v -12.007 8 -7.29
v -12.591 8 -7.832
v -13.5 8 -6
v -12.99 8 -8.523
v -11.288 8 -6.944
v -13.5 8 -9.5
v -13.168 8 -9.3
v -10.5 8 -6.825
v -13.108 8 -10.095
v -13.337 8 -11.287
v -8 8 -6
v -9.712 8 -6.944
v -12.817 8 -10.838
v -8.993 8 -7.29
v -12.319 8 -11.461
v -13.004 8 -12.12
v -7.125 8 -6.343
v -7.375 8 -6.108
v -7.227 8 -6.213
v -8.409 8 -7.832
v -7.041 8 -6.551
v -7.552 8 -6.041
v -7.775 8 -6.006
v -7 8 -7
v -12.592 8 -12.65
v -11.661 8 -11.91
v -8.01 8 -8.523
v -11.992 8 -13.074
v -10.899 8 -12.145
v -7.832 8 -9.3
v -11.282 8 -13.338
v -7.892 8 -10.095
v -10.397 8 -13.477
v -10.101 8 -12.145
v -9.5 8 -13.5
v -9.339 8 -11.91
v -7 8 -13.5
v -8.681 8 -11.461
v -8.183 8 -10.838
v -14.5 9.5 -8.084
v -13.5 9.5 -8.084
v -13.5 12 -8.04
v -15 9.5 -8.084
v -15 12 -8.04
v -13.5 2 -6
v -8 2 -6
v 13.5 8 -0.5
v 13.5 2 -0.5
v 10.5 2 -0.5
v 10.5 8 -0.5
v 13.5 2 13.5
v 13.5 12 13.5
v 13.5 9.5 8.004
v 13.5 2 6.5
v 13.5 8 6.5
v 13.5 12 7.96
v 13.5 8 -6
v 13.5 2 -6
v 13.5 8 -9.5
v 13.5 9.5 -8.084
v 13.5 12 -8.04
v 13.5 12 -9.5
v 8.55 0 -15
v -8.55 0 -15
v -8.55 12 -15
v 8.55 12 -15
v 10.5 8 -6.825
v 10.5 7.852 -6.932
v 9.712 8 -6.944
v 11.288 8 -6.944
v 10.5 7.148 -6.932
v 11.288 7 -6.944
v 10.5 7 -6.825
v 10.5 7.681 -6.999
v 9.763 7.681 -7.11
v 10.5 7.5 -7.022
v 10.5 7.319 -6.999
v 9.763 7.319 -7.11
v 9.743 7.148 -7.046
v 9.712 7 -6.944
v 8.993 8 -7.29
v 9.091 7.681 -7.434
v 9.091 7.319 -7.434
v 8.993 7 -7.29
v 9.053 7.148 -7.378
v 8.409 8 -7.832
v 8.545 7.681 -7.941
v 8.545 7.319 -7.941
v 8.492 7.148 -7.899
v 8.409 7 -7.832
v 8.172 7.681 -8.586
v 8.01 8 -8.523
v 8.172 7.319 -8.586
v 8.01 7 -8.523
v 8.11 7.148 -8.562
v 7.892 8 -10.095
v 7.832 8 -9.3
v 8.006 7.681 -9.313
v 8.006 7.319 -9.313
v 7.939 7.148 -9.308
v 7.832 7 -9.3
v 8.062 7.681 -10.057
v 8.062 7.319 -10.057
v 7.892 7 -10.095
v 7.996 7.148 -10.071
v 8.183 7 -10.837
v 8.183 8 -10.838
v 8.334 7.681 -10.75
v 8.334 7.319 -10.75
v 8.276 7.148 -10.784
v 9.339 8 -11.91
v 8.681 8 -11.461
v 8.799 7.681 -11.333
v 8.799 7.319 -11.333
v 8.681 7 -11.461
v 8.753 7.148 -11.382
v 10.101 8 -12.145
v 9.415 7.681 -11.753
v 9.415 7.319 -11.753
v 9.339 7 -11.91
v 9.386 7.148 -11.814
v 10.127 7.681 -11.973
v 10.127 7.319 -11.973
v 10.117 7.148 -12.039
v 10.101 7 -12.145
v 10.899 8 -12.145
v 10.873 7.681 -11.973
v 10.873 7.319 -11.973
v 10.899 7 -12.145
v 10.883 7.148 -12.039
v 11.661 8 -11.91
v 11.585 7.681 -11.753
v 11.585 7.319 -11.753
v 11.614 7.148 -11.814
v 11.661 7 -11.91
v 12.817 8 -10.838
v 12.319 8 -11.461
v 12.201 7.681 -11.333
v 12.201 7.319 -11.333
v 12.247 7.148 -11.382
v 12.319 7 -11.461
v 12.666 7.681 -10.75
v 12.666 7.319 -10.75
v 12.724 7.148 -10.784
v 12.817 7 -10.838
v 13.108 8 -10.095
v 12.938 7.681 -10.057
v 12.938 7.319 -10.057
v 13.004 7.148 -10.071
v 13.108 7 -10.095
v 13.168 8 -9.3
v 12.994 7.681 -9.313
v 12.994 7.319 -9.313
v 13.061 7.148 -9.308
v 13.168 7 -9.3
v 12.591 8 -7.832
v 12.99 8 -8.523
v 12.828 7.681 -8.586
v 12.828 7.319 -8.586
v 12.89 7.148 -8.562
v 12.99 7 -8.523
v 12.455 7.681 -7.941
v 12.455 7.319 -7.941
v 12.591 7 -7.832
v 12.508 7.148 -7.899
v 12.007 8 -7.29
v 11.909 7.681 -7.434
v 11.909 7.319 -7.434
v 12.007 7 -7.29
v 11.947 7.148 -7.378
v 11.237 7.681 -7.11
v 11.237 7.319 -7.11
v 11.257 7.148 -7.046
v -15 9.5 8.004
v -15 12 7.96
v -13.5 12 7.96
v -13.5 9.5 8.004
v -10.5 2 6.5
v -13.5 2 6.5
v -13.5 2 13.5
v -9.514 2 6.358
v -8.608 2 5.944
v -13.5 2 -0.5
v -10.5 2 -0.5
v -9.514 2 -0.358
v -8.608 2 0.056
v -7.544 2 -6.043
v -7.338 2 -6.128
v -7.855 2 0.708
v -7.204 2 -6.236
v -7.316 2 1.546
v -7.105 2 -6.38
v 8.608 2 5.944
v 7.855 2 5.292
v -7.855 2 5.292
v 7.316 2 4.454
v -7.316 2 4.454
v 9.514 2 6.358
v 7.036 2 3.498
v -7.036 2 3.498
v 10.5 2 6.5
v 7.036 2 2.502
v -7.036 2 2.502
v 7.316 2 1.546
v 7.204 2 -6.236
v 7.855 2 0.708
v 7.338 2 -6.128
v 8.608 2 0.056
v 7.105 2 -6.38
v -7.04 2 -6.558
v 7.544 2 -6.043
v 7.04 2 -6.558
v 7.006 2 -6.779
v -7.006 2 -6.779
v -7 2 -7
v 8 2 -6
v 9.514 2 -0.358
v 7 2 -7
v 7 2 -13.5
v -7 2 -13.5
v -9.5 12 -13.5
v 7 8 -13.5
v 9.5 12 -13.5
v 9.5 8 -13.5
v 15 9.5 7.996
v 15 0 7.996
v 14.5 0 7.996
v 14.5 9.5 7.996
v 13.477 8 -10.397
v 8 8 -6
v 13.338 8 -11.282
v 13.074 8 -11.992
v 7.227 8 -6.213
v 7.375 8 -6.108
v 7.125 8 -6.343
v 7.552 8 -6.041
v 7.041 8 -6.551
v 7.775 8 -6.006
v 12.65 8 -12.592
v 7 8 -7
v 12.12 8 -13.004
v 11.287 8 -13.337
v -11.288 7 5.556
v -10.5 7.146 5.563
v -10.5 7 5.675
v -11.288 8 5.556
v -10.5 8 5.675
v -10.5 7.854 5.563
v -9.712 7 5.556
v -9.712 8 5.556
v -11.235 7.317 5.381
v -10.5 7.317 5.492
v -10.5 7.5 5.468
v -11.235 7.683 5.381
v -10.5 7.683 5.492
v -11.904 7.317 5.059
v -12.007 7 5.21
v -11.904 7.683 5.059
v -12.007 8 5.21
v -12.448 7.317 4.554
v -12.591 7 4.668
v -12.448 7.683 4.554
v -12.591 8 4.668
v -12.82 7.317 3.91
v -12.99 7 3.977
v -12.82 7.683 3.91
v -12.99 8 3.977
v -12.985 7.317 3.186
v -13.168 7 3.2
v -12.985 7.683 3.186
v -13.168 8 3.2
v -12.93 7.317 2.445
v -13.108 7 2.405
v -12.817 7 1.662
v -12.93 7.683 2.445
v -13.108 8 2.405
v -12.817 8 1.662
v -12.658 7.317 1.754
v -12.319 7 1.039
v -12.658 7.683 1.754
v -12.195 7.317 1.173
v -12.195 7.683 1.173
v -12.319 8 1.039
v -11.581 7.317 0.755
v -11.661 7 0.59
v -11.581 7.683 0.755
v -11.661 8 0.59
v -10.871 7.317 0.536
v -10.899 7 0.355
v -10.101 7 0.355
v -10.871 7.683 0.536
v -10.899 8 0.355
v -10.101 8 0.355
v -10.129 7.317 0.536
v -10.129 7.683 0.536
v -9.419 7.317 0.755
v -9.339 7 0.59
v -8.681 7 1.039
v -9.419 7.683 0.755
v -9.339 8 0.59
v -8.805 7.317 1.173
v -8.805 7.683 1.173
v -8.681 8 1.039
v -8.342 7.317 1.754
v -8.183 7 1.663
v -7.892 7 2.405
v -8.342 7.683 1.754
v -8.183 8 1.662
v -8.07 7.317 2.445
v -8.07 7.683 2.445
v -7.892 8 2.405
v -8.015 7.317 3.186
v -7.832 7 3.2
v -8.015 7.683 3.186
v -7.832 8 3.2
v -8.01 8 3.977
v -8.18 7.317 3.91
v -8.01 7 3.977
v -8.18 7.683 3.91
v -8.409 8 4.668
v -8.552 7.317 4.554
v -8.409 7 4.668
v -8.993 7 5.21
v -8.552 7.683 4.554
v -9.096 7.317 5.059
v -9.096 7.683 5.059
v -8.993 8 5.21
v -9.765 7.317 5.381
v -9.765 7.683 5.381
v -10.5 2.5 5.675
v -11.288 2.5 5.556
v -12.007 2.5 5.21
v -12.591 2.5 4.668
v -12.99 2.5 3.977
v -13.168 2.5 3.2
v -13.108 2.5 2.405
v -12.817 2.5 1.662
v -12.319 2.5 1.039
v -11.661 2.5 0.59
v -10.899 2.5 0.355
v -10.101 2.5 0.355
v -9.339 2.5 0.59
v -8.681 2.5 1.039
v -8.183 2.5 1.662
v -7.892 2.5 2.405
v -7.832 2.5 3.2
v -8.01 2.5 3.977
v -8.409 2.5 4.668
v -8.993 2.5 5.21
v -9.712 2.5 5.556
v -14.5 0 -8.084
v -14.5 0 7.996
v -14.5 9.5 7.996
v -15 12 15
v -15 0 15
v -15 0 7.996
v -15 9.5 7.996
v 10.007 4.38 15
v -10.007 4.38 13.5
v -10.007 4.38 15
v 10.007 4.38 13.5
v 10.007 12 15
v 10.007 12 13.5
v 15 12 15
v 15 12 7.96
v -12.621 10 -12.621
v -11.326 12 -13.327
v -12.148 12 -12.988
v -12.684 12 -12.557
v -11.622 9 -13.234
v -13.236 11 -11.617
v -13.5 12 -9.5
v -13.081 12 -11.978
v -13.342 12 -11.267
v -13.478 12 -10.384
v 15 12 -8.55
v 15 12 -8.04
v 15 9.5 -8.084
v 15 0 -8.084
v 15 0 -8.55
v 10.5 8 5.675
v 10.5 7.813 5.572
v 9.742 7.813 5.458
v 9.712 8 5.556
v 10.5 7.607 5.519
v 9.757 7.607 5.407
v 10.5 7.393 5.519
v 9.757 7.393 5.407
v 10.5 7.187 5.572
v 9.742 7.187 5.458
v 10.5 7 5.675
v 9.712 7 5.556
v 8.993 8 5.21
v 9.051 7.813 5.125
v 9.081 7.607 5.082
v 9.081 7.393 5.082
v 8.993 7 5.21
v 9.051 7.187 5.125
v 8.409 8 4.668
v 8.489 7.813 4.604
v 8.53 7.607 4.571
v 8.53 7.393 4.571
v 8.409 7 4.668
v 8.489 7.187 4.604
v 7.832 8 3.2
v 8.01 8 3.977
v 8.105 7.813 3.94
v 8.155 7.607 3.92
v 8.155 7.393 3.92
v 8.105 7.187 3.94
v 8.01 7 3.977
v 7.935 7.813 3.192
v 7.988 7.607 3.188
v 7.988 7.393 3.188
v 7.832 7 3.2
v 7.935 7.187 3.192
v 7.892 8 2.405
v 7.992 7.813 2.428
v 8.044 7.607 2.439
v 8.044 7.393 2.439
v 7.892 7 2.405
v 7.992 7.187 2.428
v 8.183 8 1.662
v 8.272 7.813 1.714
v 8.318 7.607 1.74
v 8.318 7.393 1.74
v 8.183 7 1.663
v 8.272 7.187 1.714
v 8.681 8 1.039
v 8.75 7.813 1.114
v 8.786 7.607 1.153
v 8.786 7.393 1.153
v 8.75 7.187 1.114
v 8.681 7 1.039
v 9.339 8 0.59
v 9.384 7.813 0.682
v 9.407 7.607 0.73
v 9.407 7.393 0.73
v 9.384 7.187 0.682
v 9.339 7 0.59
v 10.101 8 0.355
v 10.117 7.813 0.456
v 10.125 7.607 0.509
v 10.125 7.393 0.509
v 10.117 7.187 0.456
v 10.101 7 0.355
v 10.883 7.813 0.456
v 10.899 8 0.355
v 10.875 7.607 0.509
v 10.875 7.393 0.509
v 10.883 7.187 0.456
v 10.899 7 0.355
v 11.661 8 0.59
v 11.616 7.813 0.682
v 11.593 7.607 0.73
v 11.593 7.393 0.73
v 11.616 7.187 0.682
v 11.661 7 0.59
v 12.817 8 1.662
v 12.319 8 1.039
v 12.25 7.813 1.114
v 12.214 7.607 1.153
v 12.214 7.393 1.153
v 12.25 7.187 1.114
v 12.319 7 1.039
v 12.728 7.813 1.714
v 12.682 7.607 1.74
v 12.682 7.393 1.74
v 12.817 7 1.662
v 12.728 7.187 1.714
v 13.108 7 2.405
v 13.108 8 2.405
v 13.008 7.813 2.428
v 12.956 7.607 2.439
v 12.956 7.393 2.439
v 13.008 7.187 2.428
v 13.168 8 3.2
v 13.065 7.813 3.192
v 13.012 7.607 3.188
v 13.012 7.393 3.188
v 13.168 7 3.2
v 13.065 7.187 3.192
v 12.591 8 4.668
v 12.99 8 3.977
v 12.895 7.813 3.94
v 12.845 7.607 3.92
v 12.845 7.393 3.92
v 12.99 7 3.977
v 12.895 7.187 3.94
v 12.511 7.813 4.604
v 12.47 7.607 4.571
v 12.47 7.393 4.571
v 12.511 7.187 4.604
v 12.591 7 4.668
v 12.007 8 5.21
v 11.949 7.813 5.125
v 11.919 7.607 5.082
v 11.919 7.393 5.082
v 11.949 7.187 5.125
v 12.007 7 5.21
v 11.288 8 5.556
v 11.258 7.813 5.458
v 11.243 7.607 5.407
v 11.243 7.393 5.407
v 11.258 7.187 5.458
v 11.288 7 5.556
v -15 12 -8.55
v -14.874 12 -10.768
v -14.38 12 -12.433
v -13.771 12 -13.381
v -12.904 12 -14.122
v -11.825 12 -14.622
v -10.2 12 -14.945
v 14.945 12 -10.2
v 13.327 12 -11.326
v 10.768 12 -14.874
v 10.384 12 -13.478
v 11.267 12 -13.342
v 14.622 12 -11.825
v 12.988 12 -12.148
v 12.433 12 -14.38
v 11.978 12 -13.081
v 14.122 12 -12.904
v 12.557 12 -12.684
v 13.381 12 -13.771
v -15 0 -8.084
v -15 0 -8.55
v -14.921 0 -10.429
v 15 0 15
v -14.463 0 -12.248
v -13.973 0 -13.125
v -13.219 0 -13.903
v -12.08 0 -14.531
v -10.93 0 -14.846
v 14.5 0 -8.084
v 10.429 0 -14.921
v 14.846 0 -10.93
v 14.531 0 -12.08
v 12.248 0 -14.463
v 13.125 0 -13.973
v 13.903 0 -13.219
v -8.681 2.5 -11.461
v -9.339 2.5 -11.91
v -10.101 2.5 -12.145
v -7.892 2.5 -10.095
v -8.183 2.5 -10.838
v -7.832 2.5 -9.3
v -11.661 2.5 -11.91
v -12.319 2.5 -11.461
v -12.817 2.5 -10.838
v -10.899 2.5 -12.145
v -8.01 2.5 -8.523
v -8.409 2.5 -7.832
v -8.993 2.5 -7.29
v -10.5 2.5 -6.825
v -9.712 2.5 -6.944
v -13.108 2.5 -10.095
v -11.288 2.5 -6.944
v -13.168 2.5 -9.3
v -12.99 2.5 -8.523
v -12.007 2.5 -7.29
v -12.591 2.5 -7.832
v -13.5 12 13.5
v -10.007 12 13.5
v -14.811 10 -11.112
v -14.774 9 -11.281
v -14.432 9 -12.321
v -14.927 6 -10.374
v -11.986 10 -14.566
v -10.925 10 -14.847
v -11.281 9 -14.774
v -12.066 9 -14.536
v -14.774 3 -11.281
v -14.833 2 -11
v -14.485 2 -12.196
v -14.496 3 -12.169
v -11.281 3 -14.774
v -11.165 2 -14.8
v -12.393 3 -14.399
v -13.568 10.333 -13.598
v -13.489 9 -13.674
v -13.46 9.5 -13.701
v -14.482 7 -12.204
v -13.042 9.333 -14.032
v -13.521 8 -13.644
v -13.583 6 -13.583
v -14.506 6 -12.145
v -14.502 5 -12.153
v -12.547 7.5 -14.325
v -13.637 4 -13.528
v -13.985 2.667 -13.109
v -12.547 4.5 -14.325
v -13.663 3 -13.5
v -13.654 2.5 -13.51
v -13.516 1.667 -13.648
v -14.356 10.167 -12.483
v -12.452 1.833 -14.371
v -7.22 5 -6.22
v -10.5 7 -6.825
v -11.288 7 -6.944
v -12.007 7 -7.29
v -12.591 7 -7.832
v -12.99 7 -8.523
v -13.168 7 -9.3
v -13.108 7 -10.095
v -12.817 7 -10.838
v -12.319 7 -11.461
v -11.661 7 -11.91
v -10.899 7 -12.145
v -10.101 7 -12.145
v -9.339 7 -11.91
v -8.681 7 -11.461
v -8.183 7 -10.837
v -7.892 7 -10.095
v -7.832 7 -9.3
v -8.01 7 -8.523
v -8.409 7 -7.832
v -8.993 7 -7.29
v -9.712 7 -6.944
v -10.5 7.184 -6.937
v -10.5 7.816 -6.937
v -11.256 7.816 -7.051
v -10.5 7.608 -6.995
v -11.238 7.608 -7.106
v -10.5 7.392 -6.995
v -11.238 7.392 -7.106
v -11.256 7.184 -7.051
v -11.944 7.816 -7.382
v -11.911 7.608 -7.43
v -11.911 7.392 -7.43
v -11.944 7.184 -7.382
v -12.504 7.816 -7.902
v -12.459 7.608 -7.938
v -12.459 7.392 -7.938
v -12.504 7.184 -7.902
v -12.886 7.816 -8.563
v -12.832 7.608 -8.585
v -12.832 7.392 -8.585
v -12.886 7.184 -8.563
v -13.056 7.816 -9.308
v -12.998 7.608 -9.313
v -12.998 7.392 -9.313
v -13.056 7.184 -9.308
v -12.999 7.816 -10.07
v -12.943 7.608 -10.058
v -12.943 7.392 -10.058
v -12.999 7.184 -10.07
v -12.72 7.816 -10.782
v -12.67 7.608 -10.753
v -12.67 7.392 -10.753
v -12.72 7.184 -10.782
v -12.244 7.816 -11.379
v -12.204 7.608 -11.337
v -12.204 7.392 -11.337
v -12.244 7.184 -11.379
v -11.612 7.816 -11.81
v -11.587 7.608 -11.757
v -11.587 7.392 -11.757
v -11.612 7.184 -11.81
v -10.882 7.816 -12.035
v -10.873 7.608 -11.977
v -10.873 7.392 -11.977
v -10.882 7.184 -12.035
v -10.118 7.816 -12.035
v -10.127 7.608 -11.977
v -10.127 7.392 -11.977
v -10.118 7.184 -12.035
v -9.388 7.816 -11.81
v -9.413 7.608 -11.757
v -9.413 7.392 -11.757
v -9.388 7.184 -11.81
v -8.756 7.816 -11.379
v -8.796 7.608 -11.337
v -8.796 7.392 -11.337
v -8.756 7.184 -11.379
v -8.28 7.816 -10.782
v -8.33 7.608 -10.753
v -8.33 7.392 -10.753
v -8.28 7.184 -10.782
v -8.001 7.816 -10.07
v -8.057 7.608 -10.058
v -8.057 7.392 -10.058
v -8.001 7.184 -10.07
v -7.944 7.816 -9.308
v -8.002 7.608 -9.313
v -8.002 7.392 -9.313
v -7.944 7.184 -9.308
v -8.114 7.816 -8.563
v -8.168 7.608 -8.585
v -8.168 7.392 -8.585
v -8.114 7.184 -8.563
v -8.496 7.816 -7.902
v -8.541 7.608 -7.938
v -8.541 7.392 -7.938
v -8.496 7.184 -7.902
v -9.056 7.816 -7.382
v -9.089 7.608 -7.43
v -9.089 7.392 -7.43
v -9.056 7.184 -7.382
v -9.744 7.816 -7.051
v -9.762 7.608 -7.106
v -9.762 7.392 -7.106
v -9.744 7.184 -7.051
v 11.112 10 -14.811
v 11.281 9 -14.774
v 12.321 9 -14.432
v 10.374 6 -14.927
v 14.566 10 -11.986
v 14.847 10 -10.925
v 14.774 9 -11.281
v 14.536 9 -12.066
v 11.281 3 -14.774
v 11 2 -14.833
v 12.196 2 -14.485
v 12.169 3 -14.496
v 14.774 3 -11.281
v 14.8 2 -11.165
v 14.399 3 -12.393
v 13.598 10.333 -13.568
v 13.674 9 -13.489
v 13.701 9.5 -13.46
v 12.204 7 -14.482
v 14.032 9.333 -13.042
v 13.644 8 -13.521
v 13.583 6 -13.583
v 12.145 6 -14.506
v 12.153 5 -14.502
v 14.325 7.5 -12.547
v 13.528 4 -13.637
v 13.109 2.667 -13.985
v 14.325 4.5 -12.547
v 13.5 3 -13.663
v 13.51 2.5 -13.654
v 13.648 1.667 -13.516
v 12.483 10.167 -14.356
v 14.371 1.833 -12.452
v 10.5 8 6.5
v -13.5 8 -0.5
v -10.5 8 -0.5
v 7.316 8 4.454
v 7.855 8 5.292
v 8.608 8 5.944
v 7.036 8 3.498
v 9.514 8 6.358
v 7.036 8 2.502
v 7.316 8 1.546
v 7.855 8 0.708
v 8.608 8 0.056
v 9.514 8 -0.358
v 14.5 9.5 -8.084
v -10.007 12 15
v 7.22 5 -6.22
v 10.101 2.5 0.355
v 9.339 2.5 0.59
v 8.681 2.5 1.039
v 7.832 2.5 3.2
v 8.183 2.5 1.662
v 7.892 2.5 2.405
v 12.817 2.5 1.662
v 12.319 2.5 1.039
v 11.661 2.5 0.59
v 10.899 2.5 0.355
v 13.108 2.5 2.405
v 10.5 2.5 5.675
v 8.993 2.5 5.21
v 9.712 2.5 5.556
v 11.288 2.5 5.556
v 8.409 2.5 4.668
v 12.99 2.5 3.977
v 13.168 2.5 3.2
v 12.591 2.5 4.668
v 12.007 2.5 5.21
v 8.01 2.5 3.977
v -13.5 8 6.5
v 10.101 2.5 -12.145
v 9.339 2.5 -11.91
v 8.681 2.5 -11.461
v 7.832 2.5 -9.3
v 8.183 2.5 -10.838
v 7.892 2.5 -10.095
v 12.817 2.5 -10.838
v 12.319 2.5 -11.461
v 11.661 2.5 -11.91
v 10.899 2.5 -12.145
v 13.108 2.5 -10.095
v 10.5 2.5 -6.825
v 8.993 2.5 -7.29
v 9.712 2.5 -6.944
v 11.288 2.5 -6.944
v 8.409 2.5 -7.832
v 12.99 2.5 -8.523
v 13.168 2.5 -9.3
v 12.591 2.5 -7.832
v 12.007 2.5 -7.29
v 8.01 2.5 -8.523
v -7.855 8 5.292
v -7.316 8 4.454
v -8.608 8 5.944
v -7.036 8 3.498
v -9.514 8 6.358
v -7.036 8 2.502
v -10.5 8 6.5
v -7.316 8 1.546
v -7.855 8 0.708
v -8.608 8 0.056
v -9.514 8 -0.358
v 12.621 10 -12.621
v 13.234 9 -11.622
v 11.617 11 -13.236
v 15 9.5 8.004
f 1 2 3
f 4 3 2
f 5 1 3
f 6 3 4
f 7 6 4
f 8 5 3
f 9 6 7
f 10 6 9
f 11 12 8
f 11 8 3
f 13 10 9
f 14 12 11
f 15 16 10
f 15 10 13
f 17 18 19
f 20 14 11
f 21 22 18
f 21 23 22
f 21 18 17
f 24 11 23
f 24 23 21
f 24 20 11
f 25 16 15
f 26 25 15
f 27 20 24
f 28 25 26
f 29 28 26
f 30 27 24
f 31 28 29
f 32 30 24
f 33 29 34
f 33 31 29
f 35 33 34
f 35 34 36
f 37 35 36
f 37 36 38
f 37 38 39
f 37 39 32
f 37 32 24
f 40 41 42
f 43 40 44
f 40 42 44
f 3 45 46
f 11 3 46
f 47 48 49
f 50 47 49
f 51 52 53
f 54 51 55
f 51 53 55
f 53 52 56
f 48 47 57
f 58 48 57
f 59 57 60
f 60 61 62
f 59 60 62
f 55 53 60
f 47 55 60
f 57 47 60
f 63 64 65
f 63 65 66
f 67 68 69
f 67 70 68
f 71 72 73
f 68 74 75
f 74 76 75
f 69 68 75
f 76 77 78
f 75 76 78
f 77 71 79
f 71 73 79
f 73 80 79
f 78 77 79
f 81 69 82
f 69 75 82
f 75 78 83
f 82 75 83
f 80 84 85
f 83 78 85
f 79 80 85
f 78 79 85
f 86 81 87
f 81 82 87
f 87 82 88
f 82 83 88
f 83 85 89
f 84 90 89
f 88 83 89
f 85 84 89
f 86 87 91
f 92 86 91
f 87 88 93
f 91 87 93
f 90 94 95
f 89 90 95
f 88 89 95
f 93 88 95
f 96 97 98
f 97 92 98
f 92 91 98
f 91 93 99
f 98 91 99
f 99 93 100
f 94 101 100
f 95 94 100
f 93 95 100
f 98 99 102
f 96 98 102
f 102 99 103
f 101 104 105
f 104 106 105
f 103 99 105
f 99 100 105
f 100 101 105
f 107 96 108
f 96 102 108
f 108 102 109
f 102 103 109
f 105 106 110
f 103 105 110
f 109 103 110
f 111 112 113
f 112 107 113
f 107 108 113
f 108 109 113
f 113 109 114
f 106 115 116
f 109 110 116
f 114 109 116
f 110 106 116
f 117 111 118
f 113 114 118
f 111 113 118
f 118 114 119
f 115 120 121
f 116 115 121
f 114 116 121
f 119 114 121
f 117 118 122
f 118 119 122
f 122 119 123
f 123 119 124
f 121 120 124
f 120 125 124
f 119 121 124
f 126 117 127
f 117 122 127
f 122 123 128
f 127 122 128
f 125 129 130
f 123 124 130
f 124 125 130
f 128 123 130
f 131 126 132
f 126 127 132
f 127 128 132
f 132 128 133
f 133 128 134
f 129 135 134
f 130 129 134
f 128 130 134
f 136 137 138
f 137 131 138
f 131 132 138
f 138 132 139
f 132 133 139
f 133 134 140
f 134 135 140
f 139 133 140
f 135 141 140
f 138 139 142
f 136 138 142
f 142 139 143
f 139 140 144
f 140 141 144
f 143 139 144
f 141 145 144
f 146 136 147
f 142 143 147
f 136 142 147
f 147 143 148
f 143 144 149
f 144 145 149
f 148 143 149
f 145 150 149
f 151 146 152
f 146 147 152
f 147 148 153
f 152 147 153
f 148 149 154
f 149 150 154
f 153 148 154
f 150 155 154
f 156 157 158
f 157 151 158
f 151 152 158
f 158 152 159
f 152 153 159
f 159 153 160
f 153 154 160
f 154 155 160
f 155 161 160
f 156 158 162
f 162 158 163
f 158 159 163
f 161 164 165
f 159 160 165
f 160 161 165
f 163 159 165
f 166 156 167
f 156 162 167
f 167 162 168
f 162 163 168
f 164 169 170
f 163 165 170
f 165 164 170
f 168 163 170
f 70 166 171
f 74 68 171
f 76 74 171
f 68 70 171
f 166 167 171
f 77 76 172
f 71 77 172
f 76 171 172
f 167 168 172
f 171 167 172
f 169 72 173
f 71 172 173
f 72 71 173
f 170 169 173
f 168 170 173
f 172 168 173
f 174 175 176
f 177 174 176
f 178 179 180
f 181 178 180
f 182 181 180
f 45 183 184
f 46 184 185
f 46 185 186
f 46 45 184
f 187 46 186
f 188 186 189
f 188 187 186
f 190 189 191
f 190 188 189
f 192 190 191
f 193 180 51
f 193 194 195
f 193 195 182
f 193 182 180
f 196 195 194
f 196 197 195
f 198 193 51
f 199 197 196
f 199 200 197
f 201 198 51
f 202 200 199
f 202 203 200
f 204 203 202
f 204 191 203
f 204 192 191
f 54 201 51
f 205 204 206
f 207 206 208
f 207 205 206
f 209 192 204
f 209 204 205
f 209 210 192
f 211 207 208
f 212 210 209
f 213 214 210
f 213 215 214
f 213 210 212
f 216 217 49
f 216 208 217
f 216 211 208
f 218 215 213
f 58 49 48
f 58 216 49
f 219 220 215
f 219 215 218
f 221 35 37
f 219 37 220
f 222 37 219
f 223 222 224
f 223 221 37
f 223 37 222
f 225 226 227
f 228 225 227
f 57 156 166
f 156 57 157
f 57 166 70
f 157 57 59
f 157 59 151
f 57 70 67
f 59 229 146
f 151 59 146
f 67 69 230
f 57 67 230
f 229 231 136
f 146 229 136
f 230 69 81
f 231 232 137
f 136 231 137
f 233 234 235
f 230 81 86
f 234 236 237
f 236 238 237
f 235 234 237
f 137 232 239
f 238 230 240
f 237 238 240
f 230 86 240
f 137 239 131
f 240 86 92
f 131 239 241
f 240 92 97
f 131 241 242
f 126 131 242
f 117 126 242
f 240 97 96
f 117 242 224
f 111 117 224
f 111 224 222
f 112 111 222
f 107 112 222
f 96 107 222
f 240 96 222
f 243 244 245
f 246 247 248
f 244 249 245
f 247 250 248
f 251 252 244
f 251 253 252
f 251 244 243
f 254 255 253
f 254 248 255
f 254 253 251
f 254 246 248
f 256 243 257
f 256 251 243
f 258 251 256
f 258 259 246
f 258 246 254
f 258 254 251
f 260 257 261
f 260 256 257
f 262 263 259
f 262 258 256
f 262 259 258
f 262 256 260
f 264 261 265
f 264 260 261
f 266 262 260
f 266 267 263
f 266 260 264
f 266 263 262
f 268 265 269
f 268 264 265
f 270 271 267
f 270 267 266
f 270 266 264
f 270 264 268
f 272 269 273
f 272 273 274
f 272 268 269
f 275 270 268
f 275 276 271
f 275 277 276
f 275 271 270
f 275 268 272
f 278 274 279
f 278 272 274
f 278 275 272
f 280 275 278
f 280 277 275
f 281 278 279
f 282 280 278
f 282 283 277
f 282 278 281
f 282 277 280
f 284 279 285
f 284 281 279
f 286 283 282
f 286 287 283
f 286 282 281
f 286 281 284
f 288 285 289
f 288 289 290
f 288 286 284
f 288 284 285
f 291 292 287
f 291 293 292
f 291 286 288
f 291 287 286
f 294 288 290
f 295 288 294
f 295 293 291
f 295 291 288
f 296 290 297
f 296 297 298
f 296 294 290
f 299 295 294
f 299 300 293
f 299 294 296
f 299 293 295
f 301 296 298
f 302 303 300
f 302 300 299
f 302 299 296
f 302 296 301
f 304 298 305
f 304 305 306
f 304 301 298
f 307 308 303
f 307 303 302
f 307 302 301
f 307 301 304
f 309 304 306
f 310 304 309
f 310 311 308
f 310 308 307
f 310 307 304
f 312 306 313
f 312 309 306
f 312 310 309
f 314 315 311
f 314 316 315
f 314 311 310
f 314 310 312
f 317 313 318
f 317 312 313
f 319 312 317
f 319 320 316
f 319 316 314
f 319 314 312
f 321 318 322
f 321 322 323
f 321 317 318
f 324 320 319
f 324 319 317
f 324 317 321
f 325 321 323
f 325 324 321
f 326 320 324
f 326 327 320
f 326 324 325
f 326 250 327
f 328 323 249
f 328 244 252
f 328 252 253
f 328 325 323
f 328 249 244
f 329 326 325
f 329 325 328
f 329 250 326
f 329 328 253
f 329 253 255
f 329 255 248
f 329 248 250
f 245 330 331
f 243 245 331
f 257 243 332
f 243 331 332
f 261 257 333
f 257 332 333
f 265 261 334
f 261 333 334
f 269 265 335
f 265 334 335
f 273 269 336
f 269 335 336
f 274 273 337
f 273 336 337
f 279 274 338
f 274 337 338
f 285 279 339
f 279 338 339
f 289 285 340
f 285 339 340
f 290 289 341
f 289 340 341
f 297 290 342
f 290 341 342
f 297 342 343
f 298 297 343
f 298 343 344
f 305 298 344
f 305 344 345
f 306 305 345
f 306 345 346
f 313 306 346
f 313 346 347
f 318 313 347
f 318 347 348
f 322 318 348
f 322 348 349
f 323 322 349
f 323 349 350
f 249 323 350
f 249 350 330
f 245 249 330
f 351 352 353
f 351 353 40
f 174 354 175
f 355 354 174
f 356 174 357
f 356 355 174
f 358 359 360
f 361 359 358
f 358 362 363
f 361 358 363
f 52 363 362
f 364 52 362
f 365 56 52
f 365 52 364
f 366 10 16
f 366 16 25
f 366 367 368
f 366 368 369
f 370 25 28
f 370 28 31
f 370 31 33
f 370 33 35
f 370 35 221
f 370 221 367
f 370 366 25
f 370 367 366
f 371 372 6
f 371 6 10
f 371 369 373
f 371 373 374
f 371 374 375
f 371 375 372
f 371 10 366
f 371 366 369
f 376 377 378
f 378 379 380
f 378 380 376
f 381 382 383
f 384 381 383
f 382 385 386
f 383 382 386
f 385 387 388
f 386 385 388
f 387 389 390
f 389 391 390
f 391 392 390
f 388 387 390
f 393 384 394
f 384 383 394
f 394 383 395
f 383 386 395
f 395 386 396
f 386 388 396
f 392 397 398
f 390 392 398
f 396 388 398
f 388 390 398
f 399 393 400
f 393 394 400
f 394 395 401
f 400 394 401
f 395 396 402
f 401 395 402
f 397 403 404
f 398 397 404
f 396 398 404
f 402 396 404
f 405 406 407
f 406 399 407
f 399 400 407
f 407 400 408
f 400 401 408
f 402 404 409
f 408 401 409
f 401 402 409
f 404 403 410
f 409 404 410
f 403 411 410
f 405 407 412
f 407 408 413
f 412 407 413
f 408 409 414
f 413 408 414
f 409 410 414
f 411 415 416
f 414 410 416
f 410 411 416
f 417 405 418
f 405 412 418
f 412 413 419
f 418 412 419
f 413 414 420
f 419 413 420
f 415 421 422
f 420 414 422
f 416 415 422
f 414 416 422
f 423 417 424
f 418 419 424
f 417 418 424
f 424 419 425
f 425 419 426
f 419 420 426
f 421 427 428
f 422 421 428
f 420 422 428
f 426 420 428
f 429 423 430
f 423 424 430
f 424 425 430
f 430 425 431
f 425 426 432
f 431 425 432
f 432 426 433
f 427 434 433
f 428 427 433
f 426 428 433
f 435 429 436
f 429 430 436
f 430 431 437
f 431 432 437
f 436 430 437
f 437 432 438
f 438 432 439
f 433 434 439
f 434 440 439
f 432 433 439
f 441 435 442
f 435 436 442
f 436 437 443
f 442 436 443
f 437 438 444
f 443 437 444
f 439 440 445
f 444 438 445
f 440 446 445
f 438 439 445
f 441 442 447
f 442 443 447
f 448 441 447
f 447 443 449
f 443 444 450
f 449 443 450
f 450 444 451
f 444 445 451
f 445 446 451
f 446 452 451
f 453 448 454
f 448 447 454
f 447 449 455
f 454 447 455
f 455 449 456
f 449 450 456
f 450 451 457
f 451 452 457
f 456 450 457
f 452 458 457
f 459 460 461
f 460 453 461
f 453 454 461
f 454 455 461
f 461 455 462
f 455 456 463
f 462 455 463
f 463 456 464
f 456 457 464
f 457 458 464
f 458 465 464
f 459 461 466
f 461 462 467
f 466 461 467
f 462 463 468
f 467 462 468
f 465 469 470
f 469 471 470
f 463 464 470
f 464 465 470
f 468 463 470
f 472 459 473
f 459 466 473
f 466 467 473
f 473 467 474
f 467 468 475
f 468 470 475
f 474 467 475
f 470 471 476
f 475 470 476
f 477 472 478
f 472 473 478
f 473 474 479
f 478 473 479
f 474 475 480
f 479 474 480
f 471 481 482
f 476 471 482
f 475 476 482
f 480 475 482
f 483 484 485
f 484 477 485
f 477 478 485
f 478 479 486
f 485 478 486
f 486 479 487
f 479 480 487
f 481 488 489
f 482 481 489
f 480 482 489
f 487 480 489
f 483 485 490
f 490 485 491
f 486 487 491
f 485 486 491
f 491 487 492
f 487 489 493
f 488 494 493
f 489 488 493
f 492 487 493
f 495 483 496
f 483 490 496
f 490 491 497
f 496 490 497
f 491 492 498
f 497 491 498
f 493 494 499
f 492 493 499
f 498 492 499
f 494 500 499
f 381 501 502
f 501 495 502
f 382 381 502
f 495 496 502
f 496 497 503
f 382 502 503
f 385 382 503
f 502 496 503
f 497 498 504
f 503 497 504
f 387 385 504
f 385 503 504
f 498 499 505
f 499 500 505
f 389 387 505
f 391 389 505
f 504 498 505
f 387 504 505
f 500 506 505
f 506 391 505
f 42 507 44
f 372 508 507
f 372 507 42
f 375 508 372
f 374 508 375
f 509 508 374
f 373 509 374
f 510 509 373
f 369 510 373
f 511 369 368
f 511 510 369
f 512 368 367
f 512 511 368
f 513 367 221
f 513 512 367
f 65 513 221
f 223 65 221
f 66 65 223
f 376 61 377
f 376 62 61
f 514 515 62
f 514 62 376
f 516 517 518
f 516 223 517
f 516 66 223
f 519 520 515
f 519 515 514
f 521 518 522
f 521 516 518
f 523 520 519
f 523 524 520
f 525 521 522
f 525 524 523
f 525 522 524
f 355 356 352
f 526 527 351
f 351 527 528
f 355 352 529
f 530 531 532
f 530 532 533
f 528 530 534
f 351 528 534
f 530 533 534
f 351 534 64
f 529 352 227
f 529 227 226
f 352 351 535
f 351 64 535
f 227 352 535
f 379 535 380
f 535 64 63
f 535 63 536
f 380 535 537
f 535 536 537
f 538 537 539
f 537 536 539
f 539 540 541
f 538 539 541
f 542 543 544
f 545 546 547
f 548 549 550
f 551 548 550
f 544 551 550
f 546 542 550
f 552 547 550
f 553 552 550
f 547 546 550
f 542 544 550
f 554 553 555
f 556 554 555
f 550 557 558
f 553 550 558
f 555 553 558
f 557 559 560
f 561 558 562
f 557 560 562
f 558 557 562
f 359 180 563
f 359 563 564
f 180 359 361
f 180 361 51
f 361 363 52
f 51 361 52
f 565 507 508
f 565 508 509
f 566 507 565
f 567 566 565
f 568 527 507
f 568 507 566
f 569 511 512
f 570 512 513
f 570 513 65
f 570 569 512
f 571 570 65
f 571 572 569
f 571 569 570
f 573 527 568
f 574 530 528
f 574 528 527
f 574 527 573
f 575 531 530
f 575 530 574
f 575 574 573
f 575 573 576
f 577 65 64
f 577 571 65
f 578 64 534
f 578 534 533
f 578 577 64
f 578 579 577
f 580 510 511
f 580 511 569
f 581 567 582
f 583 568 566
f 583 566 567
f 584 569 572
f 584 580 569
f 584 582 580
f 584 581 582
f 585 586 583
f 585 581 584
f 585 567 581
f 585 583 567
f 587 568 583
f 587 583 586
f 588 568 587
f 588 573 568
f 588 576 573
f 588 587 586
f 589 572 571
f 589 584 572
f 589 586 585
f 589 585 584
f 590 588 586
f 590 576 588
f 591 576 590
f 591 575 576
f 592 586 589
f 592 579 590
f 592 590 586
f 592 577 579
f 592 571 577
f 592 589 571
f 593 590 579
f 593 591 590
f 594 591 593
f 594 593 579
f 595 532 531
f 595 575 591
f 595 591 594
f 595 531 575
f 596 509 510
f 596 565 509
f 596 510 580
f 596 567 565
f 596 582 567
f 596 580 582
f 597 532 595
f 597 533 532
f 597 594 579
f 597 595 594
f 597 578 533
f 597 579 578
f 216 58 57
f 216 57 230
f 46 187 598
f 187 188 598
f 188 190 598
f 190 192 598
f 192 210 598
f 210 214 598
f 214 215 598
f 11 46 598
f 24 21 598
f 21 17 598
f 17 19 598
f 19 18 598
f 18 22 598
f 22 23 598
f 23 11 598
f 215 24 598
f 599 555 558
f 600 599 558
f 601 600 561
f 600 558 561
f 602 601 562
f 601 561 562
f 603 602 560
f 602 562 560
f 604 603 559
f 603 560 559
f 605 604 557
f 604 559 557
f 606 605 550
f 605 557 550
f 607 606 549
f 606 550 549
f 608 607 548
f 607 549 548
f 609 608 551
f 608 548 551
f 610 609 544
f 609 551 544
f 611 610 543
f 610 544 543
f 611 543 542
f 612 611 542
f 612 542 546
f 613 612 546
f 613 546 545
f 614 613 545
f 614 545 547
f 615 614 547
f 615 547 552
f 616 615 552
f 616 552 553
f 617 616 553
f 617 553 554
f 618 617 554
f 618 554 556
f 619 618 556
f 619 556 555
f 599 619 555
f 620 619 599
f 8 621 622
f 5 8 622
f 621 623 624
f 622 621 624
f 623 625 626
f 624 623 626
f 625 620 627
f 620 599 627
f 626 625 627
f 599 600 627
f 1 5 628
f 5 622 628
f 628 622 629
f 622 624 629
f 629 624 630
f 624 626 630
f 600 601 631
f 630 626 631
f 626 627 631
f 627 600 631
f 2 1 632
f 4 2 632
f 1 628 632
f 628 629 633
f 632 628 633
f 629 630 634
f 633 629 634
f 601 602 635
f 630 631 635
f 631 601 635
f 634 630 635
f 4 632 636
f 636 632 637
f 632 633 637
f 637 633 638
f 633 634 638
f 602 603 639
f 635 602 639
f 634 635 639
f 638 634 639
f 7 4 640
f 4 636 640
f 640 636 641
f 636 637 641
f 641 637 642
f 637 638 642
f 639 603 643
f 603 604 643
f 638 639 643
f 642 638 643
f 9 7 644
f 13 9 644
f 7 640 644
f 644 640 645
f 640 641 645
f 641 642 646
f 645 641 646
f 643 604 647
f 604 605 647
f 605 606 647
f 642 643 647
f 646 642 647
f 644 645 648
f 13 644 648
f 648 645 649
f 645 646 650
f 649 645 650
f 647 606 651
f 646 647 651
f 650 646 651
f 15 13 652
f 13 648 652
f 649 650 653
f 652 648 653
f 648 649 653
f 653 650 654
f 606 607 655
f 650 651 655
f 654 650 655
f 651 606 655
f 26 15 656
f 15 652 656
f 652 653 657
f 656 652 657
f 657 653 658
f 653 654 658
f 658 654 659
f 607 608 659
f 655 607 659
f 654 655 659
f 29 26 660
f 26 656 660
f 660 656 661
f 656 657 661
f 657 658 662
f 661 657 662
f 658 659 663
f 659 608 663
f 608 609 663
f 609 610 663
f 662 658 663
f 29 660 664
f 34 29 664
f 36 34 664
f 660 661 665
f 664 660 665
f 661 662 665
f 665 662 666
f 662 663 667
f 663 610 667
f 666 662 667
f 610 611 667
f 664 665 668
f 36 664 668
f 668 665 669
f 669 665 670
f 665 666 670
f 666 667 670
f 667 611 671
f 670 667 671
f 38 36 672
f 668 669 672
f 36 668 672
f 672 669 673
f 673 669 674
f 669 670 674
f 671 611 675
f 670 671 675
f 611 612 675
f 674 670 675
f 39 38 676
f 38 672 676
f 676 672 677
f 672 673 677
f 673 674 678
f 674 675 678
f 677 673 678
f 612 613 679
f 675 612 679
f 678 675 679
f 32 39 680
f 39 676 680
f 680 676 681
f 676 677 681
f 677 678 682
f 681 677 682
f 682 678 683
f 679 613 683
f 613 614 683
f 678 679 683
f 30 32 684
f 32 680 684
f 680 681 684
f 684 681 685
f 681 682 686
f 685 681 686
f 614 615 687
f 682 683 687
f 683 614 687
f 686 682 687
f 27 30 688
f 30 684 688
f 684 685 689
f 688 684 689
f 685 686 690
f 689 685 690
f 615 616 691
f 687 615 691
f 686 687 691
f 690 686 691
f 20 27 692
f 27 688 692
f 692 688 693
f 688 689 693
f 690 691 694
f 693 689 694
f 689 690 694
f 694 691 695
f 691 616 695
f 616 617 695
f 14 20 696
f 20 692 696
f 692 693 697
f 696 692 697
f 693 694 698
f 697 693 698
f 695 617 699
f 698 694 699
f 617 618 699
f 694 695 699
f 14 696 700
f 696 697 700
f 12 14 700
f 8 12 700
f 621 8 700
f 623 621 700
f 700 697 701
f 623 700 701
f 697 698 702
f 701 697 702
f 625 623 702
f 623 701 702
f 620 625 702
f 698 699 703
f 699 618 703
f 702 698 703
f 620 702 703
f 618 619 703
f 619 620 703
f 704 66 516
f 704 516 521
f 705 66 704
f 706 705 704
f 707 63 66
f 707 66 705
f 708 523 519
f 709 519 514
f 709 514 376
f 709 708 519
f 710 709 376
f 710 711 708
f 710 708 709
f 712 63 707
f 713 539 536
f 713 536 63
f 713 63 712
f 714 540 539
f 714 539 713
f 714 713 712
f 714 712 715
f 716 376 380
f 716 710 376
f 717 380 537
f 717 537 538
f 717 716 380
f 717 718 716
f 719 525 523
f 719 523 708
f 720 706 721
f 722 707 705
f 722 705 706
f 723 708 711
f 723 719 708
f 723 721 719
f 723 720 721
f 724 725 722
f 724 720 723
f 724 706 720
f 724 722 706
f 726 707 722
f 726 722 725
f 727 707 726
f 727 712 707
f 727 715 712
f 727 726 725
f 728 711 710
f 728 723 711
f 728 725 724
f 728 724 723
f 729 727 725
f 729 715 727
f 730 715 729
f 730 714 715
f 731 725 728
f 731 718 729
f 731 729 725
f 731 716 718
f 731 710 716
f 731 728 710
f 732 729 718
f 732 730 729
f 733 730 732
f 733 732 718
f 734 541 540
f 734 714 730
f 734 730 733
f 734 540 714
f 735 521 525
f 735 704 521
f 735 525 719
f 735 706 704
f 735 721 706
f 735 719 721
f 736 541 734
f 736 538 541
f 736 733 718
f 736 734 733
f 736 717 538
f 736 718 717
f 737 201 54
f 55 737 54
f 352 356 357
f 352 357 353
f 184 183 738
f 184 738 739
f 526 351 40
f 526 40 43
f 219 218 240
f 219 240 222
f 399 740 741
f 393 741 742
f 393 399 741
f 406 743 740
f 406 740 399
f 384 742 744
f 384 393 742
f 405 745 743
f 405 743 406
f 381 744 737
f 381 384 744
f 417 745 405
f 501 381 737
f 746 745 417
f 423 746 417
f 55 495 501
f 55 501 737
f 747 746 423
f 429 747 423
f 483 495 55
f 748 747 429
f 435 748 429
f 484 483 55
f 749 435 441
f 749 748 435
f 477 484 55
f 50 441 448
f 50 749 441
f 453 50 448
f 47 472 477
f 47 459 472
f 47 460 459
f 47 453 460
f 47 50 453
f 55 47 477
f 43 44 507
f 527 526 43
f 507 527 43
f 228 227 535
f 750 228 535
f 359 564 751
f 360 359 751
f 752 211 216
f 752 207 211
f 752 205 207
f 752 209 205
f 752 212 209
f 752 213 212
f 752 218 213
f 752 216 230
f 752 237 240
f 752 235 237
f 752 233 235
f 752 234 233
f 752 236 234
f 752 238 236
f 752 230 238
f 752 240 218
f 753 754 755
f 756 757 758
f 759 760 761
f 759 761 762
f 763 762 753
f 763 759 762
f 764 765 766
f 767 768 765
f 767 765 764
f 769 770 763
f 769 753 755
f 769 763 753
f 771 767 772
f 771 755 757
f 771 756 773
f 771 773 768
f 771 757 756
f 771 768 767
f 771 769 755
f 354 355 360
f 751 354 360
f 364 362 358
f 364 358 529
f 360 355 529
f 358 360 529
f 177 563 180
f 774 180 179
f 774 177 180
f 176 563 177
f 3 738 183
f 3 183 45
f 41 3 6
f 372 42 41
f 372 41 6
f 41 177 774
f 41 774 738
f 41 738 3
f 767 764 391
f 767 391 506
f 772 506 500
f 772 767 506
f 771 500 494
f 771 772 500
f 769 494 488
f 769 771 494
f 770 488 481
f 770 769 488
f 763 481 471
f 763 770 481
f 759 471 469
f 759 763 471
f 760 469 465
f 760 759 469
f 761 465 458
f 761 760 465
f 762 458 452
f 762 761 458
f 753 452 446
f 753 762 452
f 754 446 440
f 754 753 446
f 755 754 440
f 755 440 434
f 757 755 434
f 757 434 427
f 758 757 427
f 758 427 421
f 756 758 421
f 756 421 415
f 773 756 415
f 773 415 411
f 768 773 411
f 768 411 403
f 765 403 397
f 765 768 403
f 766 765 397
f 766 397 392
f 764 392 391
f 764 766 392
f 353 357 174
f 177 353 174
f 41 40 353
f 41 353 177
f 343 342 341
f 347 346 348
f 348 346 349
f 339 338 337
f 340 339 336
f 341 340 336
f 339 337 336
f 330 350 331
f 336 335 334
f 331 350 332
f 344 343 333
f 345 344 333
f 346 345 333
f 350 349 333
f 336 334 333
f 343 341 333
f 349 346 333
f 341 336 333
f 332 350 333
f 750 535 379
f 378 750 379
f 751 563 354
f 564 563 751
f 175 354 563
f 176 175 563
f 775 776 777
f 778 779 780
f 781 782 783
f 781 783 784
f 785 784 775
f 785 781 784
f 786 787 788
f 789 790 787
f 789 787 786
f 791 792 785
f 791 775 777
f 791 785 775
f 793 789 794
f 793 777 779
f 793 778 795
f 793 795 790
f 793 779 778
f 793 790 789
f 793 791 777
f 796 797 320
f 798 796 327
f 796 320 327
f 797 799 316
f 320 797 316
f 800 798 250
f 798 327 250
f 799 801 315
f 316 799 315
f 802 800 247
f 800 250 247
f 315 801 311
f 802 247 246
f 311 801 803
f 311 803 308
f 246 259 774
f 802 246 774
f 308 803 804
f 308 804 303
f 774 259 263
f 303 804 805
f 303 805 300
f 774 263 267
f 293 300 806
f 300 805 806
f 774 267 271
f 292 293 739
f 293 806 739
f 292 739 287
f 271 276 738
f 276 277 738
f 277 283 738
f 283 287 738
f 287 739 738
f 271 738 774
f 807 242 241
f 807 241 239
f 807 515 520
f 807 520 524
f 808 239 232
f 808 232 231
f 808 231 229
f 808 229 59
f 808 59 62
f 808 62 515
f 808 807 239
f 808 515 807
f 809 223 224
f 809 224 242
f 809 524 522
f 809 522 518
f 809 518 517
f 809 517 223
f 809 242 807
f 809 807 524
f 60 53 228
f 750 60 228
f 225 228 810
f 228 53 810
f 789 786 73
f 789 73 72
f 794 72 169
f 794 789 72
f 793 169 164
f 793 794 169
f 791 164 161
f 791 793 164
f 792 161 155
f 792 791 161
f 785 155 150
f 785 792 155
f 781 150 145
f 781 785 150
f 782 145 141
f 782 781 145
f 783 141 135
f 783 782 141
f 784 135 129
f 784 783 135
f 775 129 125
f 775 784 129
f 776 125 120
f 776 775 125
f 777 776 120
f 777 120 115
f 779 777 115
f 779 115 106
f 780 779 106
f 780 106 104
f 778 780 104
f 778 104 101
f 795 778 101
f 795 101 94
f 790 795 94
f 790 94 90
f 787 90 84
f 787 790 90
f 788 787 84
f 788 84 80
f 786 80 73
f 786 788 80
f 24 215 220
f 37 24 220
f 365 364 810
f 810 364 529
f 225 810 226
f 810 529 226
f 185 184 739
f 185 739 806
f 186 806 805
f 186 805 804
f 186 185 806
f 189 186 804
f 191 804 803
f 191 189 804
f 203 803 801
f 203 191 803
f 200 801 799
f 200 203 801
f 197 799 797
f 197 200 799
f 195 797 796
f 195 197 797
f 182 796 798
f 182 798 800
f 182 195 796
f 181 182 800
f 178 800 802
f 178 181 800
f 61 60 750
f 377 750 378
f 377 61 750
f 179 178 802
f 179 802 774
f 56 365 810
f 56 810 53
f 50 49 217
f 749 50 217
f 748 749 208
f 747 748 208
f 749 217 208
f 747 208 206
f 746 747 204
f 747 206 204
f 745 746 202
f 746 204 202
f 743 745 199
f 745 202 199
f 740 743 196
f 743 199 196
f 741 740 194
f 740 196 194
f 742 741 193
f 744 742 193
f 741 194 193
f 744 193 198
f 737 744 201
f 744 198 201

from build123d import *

# Parameters (mm, degrees)
SKETCH1_W            = 30.000000000000004
SKETCH1_H            = 30.000000000000004
BOSS_EXTRUDE3_DEPTH  = 12
SKETCH2_W            = 26.999999999999993
SKETCH2_H            = 27.000000000000007
CUT_EXTRUDE1_DEPTH   = 10
FILLET1_START        = -1
FILLET1_DEPTH        = 13
FILLET1_START_2      = 1.13256
FILLET1_2_DEPTH      = 10.86744
CUT_EXTRUDE2_DEPTH   = 2.5
CUT_EXTRUDE2_DRAFT   = 1.0000000000000042
MIRROR1_COPY_1_DEPTH = 2.5
MIRROR1_COPY_1_DRAFT = 1.0000000000000042
CUT_EXTRUDE3_DEPTH   = 7.62
SKETCH6_R            = 2.6750000000000007
BOSS_EXTRUDE4_DEPTH  = 6
SKETCH6_2_R          = 2.6750000000000007
BOSS_EXTRUDE5_DEPTH  = 0.5
CUT_EXTRUDE4_REACH   = 26.372
FILLET2_SIZE         = 1


with BuildPart() as part:
    # Sketch1 → Boss-Extrude3 (new body)
    with BuildSketch(Plane(origin=(0, 0, 0), x_dir=(1, 0, 0), z_dir=(0, 1, 0))):
        Rectangle(SKETCH1_W, SKETCH1_H)
    extrude(amount=BOSS_EXTRUDE3_DEPTH)

    # Sketch2 → Cut-Extrude1 (cut)
    with BuildSketch(Plane(origin=(0, 12, 0), x_dir=(1, 0, 0), z_dir=(0, 1, 0))):
        Rectangle(SKETCH2_W, SKETCH2_H)
    extrude(amount=-CUT_EXTRUDE1_DEPTH, mode=Mode.SUBTRACT)

    # Fillet1: read off the stored shape, not the designer's step
    # Fillet1 outline → Fillet1 (cut)
    with BuildSketch(Plane(origin=(0, 0, 0), x_dir=(1, 0, 0), z_dir=(0, 1, 0)).offset(FILLET1_START)):
        with BuildLine():
            Line((-8.55, 15), (8.55, 15))
            add(Edge.make_bspline(
                [(8.55, 15), (9.63487743239395, 15), (10.7197548647879, 15), (13.1108387386532, 14.5375871170573), (14.5375871170573, 13.1108387386532), (15, 10.7197548647879), (15, 9.63487743239395), (15, 8.55)],
                knots=[0, 0, 0, 0, 0, 0, 0.5, 0.5, 1, 1, 1, 1, 1, 1], degree=5))
            Line((15, 8.55), (15, 7))
            Line((15, 7), (17, 7))
            Line((17, 7), (17, 17))
            Line((17, 17), (-17, 17))
            Line((-17, 17), (-17, 7))
            Line((-17, 7), (-15, 7))
            Line((-15, 7), (-15, 8.55))
            add(Edge.make_bspline(
                [(-15, 8.55), (-15, 9.63487743239395), (-15, 10.7197548647879), (-14.5375871170573, 13.1108387386532), (-13.1108387386532, 14.5375871170573), (-10.7197548647879, 15), (-9.63487743239395, 15), (-8.55, 15)],
                knots=[0, 0, 0, 0, 0, 0, 0.5, 0.5, 1, 1, 1, 1, 1, 1], degree=5))
        make_face()
    extrude(amount=FILLET1_DEPTH, mode=Mode.SUBTRACT)

    # Fillet1 2 outline → Fillet1 2 (add)
    with BuildSketch(Plane(origin=(0, 0, 0), x_dir=(1, 0, 0), z_dir=(0, 1, 0)).offset(FILLET1_START_2)):
        with BuildLine():
            add(Edge.make_bspline(
                [(8.55, 15), (9.63487743239395, 15), (10.7197548647879, 15), (13.1108387386532, 14.5375871170573), (14.5375871170573, 13.1108387386532), (15, 10.7197548647879), (15, 9.63487743239395), (15, 8.55)],
                knots=[0, 0, 0, 0, 0, 0, 0.5, 0.5, 1, 1, 1, 1, 1, 1], degree=5))
            Line((8.55, 15), (-8.55, 15))
            add(Edge.make_bspline(
                [(-15, 8.55), (-15, 9.63487743239395), (-15, 10.7197548647879), (-14.5375871170573, 13.1108387386532), (-13.1108387386532, 14.5375871170573), (-10.7197548647879, 15), (-9.63487743239395, 15), (-8.55, 15)],
                knots=[0, 0, 0, 0, 0, 0, 0.5, 0.5, 1, 1, 1, 1, 1, 1], degree=5))
            Line((-15, 8.55), (-15, 7))
            Line((-15, 7), (-13.5, 7))
            Line((-13.5, 7), (-13.5, 9.5))
            add(Edge.make_bspline(
                [(-9.5, 13.5), (-10.1727922061358, 13.5), (-10.8455844122716, 13.5), (-12.3284271247462, 13.2132323206557), (-13.2132323206557, 12.3284271247462), (-13.5, 10.8455844122716), (-13.5, 10.1727922061358), (-13.5, 9.5)],
                knots=[0, 0, 0, 0, 0, 0, 0.5, 0.5, 1, 1, 1, 1, 1, 1], degree=5))
            Line((-9.5, 13.5), (9.5, 13.5))
            add(Edge.make_bspline(
                [(13.5, 9.5), (13.5, 10.1727922061358), (13.5, 10.8455844122716), (13.2132323206557, 12.3284271247462), (12.3284271247462, 13.2132323206557), (10.8455844122716, 13.5), (10.1727922061358, 13.5), (9.5, 13.5)],
                knots=[0, 0, 0, 0, 0, 0, 0.5, 0.5, 1, 1, 1, 1, 1, 1], degree=5))
            Line((13.5, 9.5), (13.5, 7))
            Line((13.5, 7), (15, 7))
            Line((15, 7), (15, 8.55))
        make_face()
    extrude(amount=FILLET1_2_DEPTH)


with BuildPart() as cut_extrude2_tool:
    # Sketch3 → Cut-Extrude2 (with draft: the straight prism first)
    with BuildSketch(Plane(origin=(0, 12, 0), x_dir=(1, 0, 0), z_dir=(0, 1, 0))):
        Polygon((-15.000000000000002, 8.040000000000003), (-14.999999999999998, -7.959999999999998), (-13.499999999999986, -7.959999999999998), (-13.499999999999988, 8.040000000000003), align=None)
    extrude(amount=-CUT_EXTRUDE2_DEPTH)
    # Cut-Extrude2: the draft: its side faces are tilted about the plane it starts from
    cut_extrude2_sides = [cut_extrude2_tool.faces().sort_by_distance(p)[0] for p in [
        (-15, 10.75, -0.04),
        (-14.25, 10.75, 7.96),
        (-13.5, 10.75, -0.04),
        (-14.25, 10.75, -8.04),
    ]]
    draft(cut_extrude2_sides, Plane(origin=(0, 12, 0), x_dir=(1, 0, 0), z_dir=(0, 1, 0)), CUT_EXTRUDE2_DRAFT)


with BuildPart() as part_1:
    add(part.part)

    # Cut-Extrude2: cut by cut_extrude2_tool
    add(cut_extrude2_tool.part, mode=Mode.SUBTRACT)


with BuildPart() as mirror1_copy_1_tool:
    # Mirror1 copy 1 sketch → Mirror1 copy 1 (with draft: the straight prism first)
    with BuildSketch(Plane(origin=(0, 12, 0), x_dir=(-1, 0, 0), z_dir=(0, 1, 0))):
        Polygon((-15.000000000000002, -8.040000000000003), (-14.999999999999998, 7.959999999999998), (-13.499999999999986, 7.959999999999998), (-13.499999999999988, -8.040000000000003), align=None)
    extrude(amount=-MIRROR1_COPY_1_DEPTH)
    # Mirror1 copy 1: the draft: its side faces are tilted about the plane it starts from
    mirror1_copy_1_sides = [mirror1_copy_1_tool.faces().sort_by_distance(p)[0] for p in [
        (15, 10.75, -0.04),
        (14.25, 10.75, 7.96),
        (13.5, 10.75, -0.04),
        (14.25, 10.75, -8.04),
    ]]
    draft(mirror1_copy_1_sides, Plane(origin=(0, 12, 0), x_dir=(-1, 0, 0), z_dir=(0, 1, 0)), MIRROR1_COPY_1_DRAFT)


with BuildPart() as part_2:
    add(part_1.part)

    # Mirror1 copy 1: cut by mirror1_copy_1_tool
    add(mirror1_copy_1_tool.part, mode=Mode.SUBTRACT)

    # Sketch5 → Cut-Extrude3 (cut)
    with BuildSketch(Plane(origin=(0, 12, 0), x_dir=(1, 0, 0), z_dir=(0, 1, 0))):
        Polygon((-10.006699639770744, -14.999999999999998), (10.006699639770742, -14.999999999999998), (10.006699639770742, -13.5), (-10.006699639770742, -13.500000000000002), align=None)
    extrude(amount=-CUT_EXTRUDE3_DEPTH, mode=Mode.SUBTRACT)

    # Sketch6 → Boss-Extrude4 (add)
    # profile 1 of 2: a face of its own
    with BuildSketch(Plane(origin=(0, 2, 0), x_dir=(1, 0, 0), z_dir=(0, 1, 0))):
        with BuildLine():
            Line((10.49999999999986, -6.5), (13.5, -6.5))
            Line((13.5, -6.5), (13.5, 0.5000000000000004))
            Line((13.5, 0.5000000000000004), (10.49999999999986, 0.5000000000000004))
            ThreePointArc((10.49999999999986, 0.5000000000000004), (6.99999999999986, -3), (10.49999999999986, -6.5))
        make_face()
        with Locations(Location((10.49999999999986, -2.9999999999999996, 0), (0, 0, 270))):
            Circle(SKETCH6_R, mode=Mode.SUBTRACT)
    # profile 2 of 2: a face of its own
    with BuildSketch(Plane(origin=(0, 2, 0), x_dir=(1, 0, 0), z_dir=(0, 1, 0))):
        Polygon((13.5, 9.500000000000004), (13.5, 6.0000000000000036), (7, 6.000000000000003), (7, 13.500000000000004), (13.5, 13.500000000000004), align=None)
        with Locations(Location((10.49999999999986, 9.5, 0), (0, 0, 270))):
            Circle(SKETCH6_R, mode=Mode.SUBTRACT)
    boss_extrude4 = extrude(amount=BOSS_EXTRUDE4_DEPTH)

    # Sketch6<2> → Boss-Extrude5 (add)
    with BuildSketch(Plane(origin=(0, 2, 0), x_dir=(1, 0, 0), z_dir=(0, 1, 0))):
        with Locations(Location((10.49999999999986, 9.5, 0), (0, 0, 270))):
            Circle(SKETCH6_2_R)
        with Locations(Location((10.49999999999986, -2.9999999999999996, 0), (0, 0, 270))):
            Circle(SKETCH6_2_R)
    boss_extrude5 = extrude(amount=BOSS_EXTRUDE5_DEPTH)

    # Cut-Extrude4: up to this face of the body (flat: up to its plane)
    cut_extrude4_end = Plane(part_2.part.faces().sort_by_distance((-14.25, 9.5, -0.04))[0])
    # Sketch13 → Cut-Extrude4 (cut, up to the picked face)
    with BuildSketch(Plane(origin=(0, 0, 0), x_dir=(-1, 0, 0), z_dir=(0, -1, 0)), mode=Mode.PRIVATE) as cut_extrude4_sk1:
        Polygon((14.999999999999998, -7.99636233767945), (14.499999999999996, -7.99636233767945), (14.5, 8.083637662320546), (15, 8.083637662320546), align=None)
    cut_extrude4_tool1 = split(extrude(cut_extrude4_sk1.sketch, amount=-CUT_EXTRUDE4_REACH, mode=Mode.PRIVATE), bisect_by=cut_extrude4_end, keep=Keep.BOTH, mode=Mode.PRIVATE)
    cut_extrude4 = cut_extrude4_tool1.solids().sort_by(Axis((-14.75, 0, -0.043638), (0, 1, 0)))[0]
    add(cut_extrude4, mode=Mode.SUBTRACT)

    # Mirror2: Boss-Extrude4, Boss-Extrude5, Cut-Extrude4 across plane
    add(boss_extrude4.mirror(Plane.ZY))
    add(boss_extrude5.mirror(Plane.ZY))
    add(cut_extrude4.mirror(Plane.ZY), mode=Mode.SUBTRACT)

    # Fillet2
    # a fillet whose section is not a circle: 1 mm, written as the material it takes off along each edge
    with BuildSketch(Plane(origin=(-7, 2, -6.000000000000003), x_dir=(-1, 0, 0), z_dir=(0, 1, 0))) as fillet2_piece_1:
        with BuildLine():
            add(Edge.make_bspline([(FILLET2_SIZE, 0), (FILLET2_SIZE * 0.831801948466, 0), (FILLET2_SIZE * 0.663603896932, 0), (FILLET2_SIZE * 0.292893218813, -FILLET2_SIZE * 0.0716919198361), (FILLET2_SIZE * 0.0716919198361, -FILLET2_SIZE * 0.292893218813), (0, -FILLET2_SIZE * 0.663603896932), (0, -FILLET2_SIZE * 0.831801948466), (0, -FILLET2_SIZE)], knots=[0, 0, 0, 0, 0, 0, 0.5, 0.5, 1, 1, 1, 1, 1, 1], degree=5))
            Line((0, -FILLET2_SIZE), (0, 0))
            Line((0, 0), (FILLET2_SIZE, 0))
        make_face()
    extrude(amount=8.5, mode=Mode.SUBTRACT)
    with BuildSketch(Plane(origin=(7, 2, -6.000000000000003), x_dir=(1, 0, 0), z_dir=(0, 1, 0))) as fillet2_piece_2:
        with BuildLine():
            add(Edge.make_bspline([(FILLET2_SIZE, 0), (FILLET2_SIZE * 0.831801948466, 0), (FILLET2_SIZE * 0.663603896932, 0), (FILLET2_SIZE * 0.292893218813, FILLET2_SIZE * 0.0716919198361), (FILLET2_SIZE * 0.0716919198361, FILLET2_SIZE * 0.292893218813), (0, FILLET2_SIZE * 0.663603896932), (0, FILLET2_SIZE * 0.831801948466), (0, FILLET2_SIZE)], knots=[0, 0, 0, 0, 0, 0, 0.5, 0.5, 1, 1, 1, 1, 1, 1], degree=5))
            Line((0, FILLET2_SIZE), (0, 0))
            Line((0, 0), (FILLET2_SIZE, 0))
        make_face()
    extrude(amount=8.5, mode=Mode.SUBTRACT)

    # Sketch9 → Revolve1 (revolve)
    with BuildSketch(Plane(origin=(-12.240866923994627, 8, -7.468988588672871), x_dir=(-0.6507913734559867, 0, 0.7592566023652811), z_dir=(-0.7592566023652811, 0, -0.6507913734559867)), mode=Mode.PRIVATE) as revolve1_sk:
        with BuildLine():
            Line((0, -1), (0, 0))
            ThreePointArc((0, 0), (-0.17693514578671132, -0.4999999999999999), (0, -1))
        make_face()
    revolve(revolve1_sk.sketch.rotate(Axis((-10.49999999999986, 19.424716620639604, -9.5), (0, -1, 0)), 319.398705355), axis=Axis((-10.49999999999986, 19.424716620639604, -9.5), (0, -1, 0)))

    # Sketch10 → Revolve2 (revolve)
    with BuildSketch(Plane(origin=(12.240866923994627, 8, -7.468988588672871), x_dir=(-0.6507913734559867, 0, -0.7592566023652811), z_dir=(0.7592566023652811, 0, -0.6507913734559867)), mode=Mode.PRIVATE) as revolve2_sk:
        with BuildLine():
            Line((0, -1), (0, 0))
            ThreePointArc((0, 0), (0.19685183327597433, -0.5), (0, -1))
        make_face()
    revolve(revolve2_sk.sketch.rotate(Axis((10.49999999999986, 19.424716620639604, -9.5), (0, -1, 0)), 40.601294645), axis=Axis((10.49999999999986, 19.424716620639604, -9.5), (0, -1, 0)))

    # Sketch11 → Revolve3 (revolve)
    with BuildSketch(Plane(origin=(-12.240866923994624, 8, 5.031011411327126), x_dir=(-0.650791373455986, 0, 0.7592566023652817), z_dir=(-0.7592566023652816, 0, -0.6507913734559859)), mode=Mode.PRIVATE) as revolve3_sk:
        with BuildLine():
            Line((0, 0), (1.2e-16, -1))
            ThreePointArc((1.2e-16, -1), (-0.20710678118654702, -0.4999999999999998), (0, 0))
        make_face()
    revolve(revolve3_sk.sketch.rotate(Axis((-10.49999999999986, 19.424716620639604, 2.9999999999999996), (0, -1, 0)), 319.398705355), axis=Axis((-10.49999999999986, 19.424716620639604, 2.9999999999999996), (0, -1, 0)))

    # Sketch12 → Revolve4 (revolve)
    with BuildSketch(Plane(origin=(12.240866923994624, 8, 5.031011411327126), x_dir=(-0.650791373455986, 0, -0.7592566023652817), z_dir=(0.7592566023652816, 0, -0.6507913734559859)), mode=Mode.PRIVATE) as revolve4_sk:
        with BuildLine():
            Line((0, -1), (0, 0))
            ThreePointArc((0, 0), (0.16237280325092585, -0.5), (0, -1))
        make_face()
    revolve(revolve4_sk.sketch.rotate(Axis((10.49999999999986, 19.424716620639604, 2.9999999999999996), (0, -1, 0)), 40.601294645), axis=Axis((10.49999999999986, 19.424716620639604, 2.9999999999999996), (0, -1, 0)))


solid = part_2.part
